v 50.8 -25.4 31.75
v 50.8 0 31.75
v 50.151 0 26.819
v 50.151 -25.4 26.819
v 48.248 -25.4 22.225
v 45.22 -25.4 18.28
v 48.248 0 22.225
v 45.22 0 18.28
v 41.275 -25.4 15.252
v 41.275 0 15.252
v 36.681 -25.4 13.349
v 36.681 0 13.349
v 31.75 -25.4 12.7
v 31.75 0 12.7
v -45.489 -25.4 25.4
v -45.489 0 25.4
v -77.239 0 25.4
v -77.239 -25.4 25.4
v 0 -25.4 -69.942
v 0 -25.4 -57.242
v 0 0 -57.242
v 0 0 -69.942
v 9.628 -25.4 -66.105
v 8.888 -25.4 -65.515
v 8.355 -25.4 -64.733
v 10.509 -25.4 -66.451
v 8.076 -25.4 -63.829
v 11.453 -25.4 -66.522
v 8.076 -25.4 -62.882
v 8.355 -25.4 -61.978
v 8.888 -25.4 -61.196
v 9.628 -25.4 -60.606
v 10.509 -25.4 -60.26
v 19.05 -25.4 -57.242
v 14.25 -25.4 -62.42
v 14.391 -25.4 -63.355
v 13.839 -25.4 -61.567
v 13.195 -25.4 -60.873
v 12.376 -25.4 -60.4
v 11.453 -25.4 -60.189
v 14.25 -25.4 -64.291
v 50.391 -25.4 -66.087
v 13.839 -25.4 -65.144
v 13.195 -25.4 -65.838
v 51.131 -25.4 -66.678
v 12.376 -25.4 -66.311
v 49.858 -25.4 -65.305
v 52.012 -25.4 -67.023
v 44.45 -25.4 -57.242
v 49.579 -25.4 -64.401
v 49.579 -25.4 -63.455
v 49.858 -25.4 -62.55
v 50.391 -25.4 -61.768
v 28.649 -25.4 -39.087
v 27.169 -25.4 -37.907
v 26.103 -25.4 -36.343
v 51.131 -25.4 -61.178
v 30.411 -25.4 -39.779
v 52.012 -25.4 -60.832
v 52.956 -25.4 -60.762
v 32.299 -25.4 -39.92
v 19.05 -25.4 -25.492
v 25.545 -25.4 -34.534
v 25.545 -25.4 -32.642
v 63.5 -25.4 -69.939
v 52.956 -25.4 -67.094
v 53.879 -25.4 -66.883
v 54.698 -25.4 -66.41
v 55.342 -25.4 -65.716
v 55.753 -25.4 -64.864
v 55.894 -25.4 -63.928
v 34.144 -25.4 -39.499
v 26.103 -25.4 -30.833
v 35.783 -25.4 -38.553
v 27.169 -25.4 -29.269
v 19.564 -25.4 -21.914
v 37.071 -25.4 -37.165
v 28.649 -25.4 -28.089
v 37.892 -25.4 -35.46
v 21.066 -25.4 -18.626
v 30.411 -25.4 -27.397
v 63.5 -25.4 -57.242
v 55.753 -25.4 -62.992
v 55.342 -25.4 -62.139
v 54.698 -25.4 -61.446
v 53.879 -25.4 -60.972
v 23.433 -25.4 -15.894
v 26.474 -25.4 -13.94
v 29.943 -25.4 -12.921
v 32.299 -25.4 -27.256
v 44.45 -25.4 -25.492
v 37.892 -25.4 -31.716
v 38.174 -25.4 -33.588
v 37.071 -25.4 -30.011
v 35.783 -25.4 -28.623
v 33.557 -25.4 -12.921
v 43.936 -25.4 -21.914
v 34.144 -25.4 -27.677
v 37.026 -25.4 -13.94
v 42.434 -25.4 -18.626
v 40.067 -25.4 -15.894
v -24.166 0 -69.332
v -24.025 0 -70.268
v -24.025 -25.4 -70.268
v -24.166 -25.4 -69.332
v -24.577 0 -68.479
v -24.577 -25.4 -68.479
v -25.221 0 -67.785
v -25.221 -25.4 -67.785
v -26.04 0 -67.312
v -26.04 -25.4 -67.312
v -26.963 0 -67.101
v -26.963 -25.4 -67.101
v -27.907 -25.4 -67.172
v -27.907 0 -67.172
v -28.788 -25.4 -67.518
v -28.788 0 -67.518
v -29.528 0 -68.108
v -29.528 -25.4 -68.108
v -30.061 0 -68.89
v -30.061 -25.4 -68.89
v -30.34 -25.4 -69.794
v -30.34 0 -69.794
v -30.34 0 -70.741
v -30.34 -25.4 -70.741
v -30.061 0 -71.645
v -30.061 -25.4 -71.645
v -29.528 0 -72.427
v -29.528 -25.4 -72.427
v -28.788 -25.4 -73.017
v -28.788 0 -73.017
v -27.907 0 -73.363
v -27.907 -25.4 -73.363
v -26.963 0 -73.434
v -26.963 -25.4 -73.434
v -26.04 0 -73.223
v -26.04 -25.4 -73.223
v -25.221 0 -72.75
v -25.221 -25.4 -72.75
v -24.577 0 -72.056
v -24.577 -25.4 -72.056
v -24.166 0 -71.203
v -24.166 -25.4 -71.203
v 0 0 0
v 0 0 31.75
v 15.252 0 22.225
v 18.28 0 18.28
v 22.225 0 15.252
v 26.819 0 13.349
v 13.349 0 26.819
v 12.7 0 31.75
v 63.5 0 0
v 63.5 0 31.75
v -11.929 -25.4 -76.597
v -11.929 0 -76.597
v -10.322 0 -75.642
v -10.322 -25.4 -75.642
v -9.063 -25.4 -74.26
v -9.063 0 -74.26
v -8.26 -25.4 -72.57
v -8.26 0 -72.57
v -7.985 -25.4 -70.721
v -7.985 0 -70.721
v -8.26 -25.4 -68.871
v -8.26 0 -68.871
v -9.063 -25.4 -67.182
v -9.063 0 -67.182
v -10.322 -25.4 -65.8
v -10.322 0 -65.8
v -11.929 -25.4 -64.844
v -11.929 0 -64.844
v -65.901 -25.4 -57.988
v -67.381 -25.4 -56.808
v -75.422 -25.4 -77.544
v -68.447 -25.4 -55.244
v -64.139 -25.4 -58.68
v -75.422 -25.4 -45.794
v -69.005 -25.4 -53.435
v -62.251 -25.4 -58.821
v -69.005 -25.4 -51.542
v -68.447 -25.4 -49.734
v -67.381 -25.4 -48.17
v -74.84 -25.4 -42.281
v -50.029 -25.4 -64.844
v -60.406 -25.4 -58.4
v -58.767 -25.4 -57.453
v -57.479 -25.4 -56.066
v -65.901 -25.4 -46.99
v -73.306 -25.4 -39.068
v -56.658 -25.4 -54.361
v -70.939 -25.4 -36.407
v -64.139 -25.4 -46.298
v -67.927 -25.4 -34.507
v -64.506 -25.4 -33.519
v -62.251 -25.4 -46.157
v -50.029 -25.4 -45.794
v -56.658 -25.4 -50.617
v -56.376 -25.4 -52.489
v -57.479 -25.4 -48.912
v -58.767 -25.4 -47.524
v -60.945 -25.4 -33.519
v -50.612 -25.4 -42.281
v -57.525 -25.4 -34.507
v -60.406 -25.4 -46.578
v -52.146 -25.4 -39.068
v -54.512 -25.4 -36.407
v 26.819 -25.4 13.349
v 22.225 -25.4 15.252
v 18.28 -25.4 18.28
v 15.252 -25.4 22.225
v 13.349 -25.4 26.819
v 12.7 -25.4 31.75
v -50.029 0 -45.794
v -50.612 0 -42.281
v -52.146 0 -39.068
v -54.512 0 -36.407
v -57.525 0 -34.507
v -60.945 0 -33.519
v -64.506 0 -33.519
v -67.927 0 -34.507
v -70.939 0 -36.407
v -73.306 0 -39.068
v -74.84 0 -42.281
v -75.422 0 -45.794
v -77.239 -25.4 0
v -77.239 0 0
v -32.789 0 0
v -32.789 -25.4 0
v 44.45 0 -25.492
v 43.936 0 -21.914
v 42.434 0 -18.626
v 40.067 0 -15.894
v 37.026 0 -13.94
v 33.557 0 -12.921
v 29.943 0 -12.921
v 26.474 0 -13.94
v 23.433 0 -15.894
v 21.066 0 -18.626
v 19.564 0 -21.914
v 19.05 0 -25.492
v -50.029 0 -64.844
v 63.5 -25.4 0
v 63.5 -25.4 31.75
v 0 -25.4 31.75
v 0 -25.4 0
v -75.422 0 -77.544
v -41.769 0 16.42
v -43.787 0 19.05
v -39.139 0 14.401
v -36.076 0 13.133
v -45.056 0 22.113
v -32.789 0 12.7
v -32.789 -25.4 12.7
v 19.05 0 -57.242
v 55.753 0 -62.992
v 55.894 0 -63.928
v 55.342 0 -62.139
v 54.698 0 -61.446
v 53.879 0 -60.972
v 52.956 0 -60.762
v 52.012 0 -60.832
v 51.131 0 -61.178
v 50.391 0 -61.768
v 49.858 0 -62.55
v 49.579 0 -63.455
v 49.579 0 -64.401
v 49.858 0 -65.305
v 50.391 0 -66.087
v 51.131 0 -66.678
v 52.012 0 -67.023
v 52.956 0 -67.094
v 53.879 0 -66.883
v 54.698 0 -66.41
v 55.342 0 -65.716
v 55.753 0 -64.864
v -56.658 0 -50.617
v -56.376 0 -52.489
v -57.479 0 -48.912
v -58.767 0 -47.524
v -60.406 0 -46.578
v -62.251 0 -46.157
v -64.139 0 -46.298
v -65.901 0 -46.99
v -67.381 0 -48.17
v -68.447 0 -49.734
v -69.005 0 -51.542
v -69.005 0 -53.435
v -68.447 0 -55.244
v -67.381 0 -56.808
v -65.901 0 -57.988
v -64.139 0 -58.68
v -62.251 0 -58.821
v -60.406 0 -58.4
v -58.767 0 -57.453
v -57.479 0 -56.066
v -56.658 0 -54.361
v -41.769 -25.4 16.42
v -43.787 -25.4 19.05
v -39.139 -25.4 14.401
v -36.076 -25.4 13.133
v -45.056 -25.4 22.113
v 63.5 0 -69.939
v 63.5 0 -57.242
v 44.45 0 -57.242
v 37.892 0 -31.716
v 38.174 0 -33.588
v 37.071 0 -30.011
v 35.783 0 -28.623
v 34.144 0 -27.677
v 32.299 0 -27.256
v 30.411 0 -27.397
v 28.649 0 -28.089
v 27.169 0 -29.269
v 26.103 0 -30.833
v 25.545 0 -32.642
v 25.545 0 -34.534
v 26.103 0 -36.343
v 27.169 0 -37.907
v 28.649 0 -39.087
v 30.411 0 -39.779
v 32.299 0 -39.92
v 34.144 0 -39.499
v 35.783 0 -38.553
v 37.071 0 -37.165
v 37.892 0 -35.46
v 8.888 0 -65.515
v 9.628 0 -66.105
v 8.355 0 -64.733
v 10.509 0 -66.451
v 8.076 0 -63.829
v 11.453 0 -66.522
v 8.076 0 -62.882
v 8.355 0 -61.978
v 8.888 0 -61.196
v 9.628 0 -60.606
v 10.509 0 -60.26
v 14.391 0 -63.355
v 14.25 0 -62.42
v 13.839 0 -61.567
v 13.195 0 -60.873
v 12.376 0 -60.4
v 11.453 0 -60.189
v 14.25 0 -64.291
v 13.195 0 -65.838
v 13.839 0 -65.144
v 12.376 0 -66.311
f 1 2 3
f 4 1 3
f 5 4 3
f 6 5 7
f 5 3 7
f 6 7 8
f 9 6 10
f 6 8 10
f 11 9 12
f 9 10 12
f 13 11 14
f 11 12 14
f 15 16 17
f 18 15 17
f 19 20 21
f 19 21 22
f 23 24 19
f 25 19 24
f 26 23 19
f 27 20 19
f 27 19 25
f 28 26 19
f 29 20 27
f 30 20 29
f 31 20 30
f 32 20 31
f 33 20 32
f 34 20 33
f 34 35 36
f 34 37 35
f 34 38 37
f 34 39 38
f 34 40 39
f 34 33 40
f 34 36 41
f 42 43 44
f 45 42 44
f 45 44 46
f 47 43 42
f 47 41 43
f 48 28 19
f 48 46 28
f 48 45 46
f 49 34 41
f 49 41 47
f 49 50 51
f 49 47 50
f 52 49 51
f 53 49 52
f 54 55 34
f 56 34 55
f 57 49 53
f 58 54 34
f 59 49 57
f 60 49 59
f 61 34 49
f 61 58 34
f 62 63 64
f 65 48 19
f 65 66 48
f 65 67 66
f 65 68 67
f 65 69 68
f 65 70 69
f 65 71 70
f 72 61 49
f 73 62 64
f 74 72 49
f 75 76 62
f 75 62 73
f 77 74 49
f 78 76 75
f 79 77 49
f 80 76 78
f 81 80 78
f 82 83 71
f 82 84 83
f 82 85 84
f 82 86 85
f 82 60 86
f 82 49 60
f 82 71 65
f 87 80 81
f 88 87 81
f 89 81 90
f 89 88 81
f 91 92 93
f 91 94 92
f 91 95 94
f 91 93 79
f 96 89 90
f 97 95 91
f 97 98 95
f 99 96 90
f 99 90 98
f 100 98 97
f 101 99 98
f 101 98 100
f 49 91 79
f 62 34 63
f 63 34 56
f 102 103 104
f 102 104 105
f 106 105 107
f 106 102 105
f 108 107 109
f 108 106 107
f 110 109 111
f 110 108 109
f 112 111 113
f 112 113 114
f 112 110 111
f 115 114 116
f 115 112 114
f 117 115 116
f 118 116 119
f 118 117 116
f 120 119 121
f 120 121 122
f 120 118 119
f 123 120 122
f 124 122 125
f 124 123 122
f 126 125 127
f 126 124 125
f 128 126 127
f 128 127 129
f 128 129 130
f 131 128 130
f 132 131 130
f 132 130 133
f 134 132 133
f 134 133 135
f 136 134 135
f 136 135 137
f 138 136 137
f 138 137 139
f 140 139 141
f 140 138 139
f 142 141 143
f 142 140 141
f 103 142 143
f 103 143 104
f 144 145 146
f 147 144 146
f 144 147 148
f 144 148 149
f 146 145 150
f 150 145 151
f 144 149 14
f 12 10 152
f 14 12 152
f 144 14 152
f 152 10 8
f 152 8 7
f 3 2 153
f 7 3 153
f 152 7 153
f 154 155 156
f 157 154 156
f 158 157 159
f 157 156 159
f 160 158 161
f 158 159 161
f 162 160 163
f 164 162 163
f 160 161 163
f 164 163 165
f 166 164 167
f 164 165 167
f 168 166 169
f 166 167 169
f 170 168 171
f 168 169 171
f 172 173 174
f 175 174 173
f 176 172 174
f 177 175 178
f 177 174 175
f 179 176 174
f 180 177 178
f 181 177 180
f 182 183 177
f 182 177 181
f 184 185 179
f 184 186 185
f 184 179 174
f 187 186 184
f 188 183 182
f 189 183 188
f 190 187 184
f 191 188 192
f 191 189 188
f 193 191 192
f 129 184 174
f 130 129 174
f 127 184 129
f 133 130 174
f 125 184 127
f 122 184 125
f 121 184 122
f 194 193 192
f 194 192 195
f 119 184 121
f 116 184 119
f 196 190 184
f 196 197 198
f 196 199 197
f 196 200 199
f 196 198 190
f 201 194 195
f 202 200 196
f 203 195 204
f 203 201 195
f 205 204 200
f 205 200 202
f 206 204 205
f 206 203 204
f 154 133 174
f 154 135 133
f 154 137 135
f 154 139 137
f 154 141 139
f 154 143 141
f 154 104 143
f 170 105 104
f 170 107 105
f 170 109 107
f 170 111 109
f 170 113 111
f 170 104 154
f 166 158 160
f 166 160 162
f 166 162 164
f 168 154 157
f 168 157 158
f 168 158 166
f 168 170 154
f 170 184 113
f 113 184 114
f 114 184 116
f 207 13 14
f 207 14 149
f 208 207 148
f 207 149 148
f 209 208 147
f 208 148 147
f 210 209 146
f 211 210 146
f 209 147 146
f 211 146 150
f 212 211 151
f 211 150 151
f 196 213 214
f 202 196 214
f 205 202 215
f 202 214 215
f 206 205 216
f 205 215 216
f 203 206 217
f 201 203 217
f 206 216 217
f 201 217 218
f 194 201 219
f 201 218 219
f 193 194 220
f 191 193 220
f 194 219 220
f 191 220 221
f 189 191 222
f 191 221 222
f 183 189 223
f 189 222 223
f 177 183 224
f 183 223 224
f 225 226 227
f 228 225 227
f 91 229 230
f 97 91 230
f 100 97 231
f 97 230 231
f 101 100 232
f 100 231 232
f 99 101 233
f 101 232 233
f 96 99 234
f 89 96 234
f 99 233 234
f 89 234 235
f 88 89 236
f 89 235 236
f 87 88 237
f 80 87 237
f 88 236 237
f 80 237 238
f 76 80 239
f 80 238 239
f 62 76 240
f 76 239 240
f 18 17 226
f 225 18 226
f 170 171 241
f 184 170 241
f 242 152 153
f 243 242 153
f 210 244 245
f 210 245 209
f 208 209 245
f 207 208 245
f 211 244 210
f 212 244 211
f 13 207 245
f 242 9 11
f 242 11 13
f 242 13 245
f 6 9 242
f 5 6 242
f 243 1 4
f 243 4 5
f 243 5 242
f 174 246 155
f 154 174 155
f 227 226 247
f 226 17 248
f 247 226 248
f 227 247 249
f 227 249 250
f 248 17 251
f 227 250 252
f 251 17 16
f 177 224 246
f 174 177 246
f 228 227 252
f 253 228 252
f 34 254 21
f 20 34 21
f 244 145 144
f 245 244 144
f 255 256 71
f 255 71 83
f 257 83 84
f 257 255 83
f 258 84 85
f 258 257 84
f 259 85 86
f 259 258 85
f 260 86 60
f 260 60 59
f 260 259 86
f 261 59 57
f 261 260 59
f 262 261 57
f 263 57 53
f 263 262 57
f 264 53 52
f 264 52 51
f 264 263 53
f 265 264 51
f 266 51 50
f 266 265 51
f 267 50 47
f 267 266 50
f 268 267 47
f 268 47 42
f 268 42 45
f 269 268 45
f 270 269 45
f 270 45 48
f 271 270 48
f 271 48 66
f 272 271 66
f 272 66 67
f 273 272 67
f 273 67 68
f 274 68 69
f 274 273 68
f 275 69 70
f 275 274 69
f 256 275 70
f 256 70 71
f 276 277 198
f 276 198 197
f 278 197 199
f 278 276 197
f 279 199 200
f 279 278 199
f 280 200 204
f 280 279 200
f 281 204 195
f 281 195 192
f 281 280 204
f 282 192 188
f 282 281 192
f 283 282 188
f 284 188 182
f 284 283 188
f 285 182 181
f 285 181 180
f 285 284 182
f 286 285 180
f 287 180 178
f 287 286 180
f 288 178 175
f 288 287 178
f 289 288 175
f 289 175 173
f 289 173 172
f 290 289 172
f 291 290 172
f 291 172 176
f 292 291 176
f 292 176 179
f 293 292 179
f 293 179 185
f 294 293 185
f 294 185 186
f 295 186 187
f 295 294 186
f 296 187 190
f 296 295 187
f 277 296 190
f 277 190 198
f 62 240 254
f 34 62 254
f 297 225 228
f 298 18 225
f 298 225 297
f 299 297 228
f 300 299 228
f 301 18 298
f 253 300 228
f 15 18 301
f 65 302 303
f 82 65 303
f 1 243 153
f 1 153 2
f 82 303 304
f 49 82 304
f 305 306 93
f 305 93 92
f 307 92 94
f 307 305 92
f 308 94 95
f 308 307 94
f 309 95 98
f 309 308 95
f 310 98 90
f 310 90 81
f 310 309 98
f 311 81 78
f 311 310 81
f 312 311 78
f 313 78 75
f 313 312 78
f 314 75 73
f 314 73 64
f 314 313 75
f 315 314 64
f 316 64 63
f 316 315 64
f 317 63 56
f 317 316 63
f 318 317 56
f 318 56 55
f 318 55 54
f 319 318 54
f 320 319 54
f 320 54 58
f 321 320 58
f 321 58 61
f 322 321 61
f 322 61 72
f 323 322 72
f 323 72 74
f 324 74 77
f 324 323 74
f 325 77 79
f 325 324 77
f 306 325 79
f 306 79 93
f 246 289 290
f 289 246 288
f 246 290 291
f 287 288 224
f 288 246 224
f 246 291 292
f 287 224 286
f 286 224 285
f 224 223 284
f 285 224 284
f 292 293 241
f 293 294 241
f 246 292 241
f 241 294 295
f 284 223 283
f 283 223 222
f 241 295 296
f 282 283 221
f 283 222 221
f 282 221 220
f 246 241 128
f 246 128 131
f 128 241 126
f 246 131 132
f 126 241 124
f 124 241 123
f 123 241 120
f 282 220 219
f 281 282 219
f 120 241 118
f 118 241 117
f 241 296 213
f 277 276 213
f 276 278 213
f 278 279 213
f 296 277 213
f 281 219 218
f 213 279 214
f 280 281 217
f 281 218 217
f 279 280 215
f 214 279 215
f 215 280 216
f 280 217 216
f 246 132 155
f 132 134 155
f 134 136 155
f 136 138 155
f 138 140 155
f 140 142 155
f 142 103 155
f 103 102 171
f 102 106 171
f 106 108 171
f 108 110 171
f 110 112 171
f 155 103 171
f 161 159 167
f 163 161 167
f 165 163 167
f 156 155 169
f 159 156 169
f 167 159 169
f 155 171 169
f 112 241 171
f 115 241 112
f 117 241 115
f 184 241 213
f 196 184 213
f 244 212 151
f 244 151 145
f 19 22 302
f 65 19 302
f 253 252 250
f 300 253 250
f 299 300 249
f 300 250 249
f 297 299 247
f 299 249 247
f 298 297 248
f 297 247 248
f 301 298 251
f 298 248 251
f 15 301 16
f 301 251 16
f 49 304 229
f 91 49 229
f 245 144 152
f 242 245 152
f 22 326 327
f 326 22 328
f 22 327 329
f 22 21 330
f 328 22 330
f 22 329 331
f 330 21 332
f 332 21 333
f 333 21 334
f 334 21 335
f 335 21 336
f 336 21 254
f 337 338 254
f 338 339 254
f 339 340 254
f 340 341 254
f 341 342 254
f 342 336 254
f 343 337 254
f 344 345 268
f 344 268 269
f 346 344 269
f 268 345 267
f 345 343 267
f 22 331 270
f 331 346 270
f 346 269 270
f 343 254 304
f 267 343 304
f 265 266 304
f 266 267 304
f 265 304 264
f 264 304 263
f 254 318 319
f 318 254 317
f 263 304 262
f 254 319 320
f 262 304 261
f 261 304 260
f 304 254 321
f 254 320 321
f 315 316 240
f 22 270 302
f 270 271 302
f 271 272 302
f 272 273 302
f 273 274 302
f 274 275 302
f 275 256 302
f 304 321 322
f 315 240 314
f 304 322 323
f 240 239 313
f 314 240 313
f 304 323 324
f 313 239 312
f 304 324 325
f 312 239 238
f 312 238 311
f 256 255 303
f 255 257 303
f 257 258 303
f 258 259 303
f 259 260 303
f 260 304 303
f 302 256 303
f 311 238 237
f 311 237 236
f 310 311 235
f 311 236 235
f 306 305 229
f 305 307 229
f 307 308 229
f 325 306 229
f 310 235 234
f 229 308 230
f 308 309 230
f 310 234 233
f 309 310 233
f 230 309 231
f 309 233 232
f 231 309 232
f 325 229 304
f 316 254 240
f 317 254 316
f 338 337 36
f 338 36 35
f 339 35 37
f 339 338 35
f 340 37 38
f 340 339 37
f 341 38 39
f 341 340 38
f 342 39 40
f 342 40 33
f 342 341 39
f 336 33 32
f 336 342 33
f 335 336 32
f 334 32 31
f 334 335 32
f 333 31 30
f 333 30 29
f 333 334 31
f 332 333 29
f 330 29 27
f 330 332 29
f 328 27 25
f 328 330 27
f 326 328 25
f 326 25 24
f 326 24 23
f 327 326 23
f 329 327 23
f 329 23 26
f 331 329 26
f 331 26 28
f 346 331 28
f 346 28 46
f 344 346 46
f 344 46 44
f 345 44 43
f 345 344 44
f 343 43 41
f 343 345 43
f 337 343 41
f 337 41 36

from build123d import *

# Parameters (mm, degrees)
F1_DEPTH = 25.4
F2_DEPTH = 25.4
F4_DEPTH = 25.4
F5_R     = 3.175
F5_R_2   = 6.35
F6_DEPTH = 25.4
F7_R     = 3.175
F7_R_2   = 6.35
F8_DEPTH = 25.4
F9_DEPTH = 25.4


with BuildPart() as f1:
    # F0 (on Front) → F1 (new body)
    with BuildSketch(Plane.XZ):
        with BuildLine():
            Line((12.7, 31.75), (0, 31.75))
            Line((0, 31.75), (0, 0))
            Line((0, 0), (31.75, 0))
            Line((31.75, 0), (31.75, 12.7))
            ThreePointArc((31.75, 12.7), (18.2796158184, 18.2796158184), (12.7, 31.75))
        make_face()
        with BuildLine():
            Line((31.75, 12.7), (31.75, 0))
            Line((31.75, 0), (63.5, 0))
            Line((63.5, 0), (63.5, 31.75))
            Line((63.5, 31.75), (50.8, 31.75))
            ThreePointArc((50.8, 31.75), (45.2203841816, 18.2796158184), (31.75, 12.7))
        make_face()
    extrude(amount=F1_DEPTH)

    # F0 (on Front) → F2 (join)
    with BuildSketch(Plane.XZ):
        with BuildLine():
            Line((12.7, 31.75), (0, 31.75))
            Line((0, 31.75), (0, 0))
            Line((0, 0), (31.75, 0))
            Line((31.75, 0), (31.75, 12.7))
            ThreePointArc((31.75, 12.7), (18.2796158184, 18.2796158184), (12.7, 31.75))
        make_face()
        with BuildLine():
            Line((31.75, 12.7), (31.75, 0))
            Line((31.75, 0), (63.5, 0))
            Line((63.5, 0), (63.5, 31.75))
            Line((63.5, 31.75), (50.8, 31.75))
            ThreePointArc((50.8, 31.75), (45.2203841816, 18.2796158184), (31.75, 12.7))
        make_face()
    extrude(amount=F2_DEPTH)


with BuildPart() as f4:
    # F3 (on Front) → F4 (new body)
    with BuildSketch(Plane.XZ):
        with BuildLine():
            Line((-77.2387412882, 25.4), (-77.2387412882, 0))
            Line((-77.2387412882, 0), (-32.7887412882, 0))
            Line((-32.7887412882, 0), (-32.7887412882, 12.7))
            ThreePointArc((-32.7887412882, 12.7), (-41.7689974093, 16.4197438789), (-45.4887412882, 25.4))
            Line((-45.4887412882, 25.4), (-77.2387412882, 25.4))
        make_face()
    extrude(amount=F4_DEPTH)


with BuildPart() as f6:
    # F5 (on Front) → F6 (new body)
    with BuildSketch(Plane.XZ):
        with BuildLine():
            Line((-75.4223912954, -45.7940514279), (-75.4223912954, -77.5440514279))
            Line((-75.4223912954, -77.5440514279), (-11.9294473242, -76.5974438719))
            ThreePointArc((-11.9294473242, -76.5974438719), (-7.9850535917, -70.7207476499), (-11.9294473242, -64.8440514279))
            Line((-11.9294473242, -64.8440514279), (-50.0294473242, -64.8440514279))
            Line((-50.0294473242, -64.8440514279), (-50.0294473242, -45.7940514279))
            ThreePointArc((-50.0294473242, -45.7940514279), (-62.7259193098, -33.3933825462), (-75.4223912954, -45.7940514279))
        make_face()
        with Locations((-27.2002895612, -70.2675515921)):
            Circle(F5_R, mode=Mode.SUBTRACT)
        with Locations((-62.7259193098, -52.4888336658)):
            Circle(F5_R_2, mode=Mode.SUBTRACT)
    extrude(amount=F6_DEPTH)


with BuildPart() as f8:
    # F7 (on Front) → F8 (new body)
    with BuildSketch(Plane.XZ):
        with BuildLine():
            Line((0, -57.2420115179), (0, -69.9420115179))
            Line((0, -69.9420115179), (63.5, -69.9386224151))
            Line((63.5, -69.9386224151), (63.5, -57.2420115179))
            Line((63.5, -57.2420115179), (44.45, -57.2420115179))
            Line((44.45, -57.2420115179), (44.45, -25.4920115179))
            ThreePointArc((44.45, -25.4920115179), (31.75, -12.7920115179), (19.05, -25.4920115179))
            Line((19.05, -25.4920115179), (19.05, -57.2420115179))
            Line((19.05, -57.2420115179), (0, -57.2420115179))
        make_face()
        with Locations((11.2158823758, -63.3554384112)):
            Circle(F7_R, mode=Mode.SUBTRACT)
        with Locations((52.7185946703, -63.9278888702)):
            Circle(F7_R, mode=Mode.SUBTRACT)
        with Locations((31.8241268396, -33.5879698396)):
            Circle(F7_R_2, mode=Mode.SUBTRACT)
    extrude(amount=F8_DEPTH)

    # F7 (on Front) → F9 (join)
    with BuildSketch(Plane.XZ):
        with BuildLine():
            Line((0, -57.2420115179), (0, -69.9420115179))
            Line((0, -69.9420115179), (63.5, -69.9386224151))
            Line((63.5, -69.9386224151), (63.5, -57.2420115179))
            Line((63.5, -57.2420115179), (44.45, -57.2420115179))
            Line((44.45, -57.2420115179), (44.45, -25.4920115179))
            ThreePointArc((44.45, -25.4920115179), (31.75, -12.7920115179), (19.05, -25.4920115179))
            Line((19.05, -25.4920115179), (19.05, -57.2420115179))
            Line((19.05, -57.2420115179), (0, -57.2420115179))
        make_face()
        with Locations((11.2158823758, -63.3554384112)):
            Circle(F7_R, mode=Mode.SUBTRACT)
        with Locations((52.7185946703, -63.9278888702)):
            Circle(F7_R, mode=Mode.SUBTRACT)
        with Locations((31.8241268396, -33.5879698396)):
            Circle(F7_R_2, mode=Mode.SUBTRACT)
    extrude(amount=F9_DEPTH)


solid = Compound([f1.part, f4.part, f6.part, f8.part])
